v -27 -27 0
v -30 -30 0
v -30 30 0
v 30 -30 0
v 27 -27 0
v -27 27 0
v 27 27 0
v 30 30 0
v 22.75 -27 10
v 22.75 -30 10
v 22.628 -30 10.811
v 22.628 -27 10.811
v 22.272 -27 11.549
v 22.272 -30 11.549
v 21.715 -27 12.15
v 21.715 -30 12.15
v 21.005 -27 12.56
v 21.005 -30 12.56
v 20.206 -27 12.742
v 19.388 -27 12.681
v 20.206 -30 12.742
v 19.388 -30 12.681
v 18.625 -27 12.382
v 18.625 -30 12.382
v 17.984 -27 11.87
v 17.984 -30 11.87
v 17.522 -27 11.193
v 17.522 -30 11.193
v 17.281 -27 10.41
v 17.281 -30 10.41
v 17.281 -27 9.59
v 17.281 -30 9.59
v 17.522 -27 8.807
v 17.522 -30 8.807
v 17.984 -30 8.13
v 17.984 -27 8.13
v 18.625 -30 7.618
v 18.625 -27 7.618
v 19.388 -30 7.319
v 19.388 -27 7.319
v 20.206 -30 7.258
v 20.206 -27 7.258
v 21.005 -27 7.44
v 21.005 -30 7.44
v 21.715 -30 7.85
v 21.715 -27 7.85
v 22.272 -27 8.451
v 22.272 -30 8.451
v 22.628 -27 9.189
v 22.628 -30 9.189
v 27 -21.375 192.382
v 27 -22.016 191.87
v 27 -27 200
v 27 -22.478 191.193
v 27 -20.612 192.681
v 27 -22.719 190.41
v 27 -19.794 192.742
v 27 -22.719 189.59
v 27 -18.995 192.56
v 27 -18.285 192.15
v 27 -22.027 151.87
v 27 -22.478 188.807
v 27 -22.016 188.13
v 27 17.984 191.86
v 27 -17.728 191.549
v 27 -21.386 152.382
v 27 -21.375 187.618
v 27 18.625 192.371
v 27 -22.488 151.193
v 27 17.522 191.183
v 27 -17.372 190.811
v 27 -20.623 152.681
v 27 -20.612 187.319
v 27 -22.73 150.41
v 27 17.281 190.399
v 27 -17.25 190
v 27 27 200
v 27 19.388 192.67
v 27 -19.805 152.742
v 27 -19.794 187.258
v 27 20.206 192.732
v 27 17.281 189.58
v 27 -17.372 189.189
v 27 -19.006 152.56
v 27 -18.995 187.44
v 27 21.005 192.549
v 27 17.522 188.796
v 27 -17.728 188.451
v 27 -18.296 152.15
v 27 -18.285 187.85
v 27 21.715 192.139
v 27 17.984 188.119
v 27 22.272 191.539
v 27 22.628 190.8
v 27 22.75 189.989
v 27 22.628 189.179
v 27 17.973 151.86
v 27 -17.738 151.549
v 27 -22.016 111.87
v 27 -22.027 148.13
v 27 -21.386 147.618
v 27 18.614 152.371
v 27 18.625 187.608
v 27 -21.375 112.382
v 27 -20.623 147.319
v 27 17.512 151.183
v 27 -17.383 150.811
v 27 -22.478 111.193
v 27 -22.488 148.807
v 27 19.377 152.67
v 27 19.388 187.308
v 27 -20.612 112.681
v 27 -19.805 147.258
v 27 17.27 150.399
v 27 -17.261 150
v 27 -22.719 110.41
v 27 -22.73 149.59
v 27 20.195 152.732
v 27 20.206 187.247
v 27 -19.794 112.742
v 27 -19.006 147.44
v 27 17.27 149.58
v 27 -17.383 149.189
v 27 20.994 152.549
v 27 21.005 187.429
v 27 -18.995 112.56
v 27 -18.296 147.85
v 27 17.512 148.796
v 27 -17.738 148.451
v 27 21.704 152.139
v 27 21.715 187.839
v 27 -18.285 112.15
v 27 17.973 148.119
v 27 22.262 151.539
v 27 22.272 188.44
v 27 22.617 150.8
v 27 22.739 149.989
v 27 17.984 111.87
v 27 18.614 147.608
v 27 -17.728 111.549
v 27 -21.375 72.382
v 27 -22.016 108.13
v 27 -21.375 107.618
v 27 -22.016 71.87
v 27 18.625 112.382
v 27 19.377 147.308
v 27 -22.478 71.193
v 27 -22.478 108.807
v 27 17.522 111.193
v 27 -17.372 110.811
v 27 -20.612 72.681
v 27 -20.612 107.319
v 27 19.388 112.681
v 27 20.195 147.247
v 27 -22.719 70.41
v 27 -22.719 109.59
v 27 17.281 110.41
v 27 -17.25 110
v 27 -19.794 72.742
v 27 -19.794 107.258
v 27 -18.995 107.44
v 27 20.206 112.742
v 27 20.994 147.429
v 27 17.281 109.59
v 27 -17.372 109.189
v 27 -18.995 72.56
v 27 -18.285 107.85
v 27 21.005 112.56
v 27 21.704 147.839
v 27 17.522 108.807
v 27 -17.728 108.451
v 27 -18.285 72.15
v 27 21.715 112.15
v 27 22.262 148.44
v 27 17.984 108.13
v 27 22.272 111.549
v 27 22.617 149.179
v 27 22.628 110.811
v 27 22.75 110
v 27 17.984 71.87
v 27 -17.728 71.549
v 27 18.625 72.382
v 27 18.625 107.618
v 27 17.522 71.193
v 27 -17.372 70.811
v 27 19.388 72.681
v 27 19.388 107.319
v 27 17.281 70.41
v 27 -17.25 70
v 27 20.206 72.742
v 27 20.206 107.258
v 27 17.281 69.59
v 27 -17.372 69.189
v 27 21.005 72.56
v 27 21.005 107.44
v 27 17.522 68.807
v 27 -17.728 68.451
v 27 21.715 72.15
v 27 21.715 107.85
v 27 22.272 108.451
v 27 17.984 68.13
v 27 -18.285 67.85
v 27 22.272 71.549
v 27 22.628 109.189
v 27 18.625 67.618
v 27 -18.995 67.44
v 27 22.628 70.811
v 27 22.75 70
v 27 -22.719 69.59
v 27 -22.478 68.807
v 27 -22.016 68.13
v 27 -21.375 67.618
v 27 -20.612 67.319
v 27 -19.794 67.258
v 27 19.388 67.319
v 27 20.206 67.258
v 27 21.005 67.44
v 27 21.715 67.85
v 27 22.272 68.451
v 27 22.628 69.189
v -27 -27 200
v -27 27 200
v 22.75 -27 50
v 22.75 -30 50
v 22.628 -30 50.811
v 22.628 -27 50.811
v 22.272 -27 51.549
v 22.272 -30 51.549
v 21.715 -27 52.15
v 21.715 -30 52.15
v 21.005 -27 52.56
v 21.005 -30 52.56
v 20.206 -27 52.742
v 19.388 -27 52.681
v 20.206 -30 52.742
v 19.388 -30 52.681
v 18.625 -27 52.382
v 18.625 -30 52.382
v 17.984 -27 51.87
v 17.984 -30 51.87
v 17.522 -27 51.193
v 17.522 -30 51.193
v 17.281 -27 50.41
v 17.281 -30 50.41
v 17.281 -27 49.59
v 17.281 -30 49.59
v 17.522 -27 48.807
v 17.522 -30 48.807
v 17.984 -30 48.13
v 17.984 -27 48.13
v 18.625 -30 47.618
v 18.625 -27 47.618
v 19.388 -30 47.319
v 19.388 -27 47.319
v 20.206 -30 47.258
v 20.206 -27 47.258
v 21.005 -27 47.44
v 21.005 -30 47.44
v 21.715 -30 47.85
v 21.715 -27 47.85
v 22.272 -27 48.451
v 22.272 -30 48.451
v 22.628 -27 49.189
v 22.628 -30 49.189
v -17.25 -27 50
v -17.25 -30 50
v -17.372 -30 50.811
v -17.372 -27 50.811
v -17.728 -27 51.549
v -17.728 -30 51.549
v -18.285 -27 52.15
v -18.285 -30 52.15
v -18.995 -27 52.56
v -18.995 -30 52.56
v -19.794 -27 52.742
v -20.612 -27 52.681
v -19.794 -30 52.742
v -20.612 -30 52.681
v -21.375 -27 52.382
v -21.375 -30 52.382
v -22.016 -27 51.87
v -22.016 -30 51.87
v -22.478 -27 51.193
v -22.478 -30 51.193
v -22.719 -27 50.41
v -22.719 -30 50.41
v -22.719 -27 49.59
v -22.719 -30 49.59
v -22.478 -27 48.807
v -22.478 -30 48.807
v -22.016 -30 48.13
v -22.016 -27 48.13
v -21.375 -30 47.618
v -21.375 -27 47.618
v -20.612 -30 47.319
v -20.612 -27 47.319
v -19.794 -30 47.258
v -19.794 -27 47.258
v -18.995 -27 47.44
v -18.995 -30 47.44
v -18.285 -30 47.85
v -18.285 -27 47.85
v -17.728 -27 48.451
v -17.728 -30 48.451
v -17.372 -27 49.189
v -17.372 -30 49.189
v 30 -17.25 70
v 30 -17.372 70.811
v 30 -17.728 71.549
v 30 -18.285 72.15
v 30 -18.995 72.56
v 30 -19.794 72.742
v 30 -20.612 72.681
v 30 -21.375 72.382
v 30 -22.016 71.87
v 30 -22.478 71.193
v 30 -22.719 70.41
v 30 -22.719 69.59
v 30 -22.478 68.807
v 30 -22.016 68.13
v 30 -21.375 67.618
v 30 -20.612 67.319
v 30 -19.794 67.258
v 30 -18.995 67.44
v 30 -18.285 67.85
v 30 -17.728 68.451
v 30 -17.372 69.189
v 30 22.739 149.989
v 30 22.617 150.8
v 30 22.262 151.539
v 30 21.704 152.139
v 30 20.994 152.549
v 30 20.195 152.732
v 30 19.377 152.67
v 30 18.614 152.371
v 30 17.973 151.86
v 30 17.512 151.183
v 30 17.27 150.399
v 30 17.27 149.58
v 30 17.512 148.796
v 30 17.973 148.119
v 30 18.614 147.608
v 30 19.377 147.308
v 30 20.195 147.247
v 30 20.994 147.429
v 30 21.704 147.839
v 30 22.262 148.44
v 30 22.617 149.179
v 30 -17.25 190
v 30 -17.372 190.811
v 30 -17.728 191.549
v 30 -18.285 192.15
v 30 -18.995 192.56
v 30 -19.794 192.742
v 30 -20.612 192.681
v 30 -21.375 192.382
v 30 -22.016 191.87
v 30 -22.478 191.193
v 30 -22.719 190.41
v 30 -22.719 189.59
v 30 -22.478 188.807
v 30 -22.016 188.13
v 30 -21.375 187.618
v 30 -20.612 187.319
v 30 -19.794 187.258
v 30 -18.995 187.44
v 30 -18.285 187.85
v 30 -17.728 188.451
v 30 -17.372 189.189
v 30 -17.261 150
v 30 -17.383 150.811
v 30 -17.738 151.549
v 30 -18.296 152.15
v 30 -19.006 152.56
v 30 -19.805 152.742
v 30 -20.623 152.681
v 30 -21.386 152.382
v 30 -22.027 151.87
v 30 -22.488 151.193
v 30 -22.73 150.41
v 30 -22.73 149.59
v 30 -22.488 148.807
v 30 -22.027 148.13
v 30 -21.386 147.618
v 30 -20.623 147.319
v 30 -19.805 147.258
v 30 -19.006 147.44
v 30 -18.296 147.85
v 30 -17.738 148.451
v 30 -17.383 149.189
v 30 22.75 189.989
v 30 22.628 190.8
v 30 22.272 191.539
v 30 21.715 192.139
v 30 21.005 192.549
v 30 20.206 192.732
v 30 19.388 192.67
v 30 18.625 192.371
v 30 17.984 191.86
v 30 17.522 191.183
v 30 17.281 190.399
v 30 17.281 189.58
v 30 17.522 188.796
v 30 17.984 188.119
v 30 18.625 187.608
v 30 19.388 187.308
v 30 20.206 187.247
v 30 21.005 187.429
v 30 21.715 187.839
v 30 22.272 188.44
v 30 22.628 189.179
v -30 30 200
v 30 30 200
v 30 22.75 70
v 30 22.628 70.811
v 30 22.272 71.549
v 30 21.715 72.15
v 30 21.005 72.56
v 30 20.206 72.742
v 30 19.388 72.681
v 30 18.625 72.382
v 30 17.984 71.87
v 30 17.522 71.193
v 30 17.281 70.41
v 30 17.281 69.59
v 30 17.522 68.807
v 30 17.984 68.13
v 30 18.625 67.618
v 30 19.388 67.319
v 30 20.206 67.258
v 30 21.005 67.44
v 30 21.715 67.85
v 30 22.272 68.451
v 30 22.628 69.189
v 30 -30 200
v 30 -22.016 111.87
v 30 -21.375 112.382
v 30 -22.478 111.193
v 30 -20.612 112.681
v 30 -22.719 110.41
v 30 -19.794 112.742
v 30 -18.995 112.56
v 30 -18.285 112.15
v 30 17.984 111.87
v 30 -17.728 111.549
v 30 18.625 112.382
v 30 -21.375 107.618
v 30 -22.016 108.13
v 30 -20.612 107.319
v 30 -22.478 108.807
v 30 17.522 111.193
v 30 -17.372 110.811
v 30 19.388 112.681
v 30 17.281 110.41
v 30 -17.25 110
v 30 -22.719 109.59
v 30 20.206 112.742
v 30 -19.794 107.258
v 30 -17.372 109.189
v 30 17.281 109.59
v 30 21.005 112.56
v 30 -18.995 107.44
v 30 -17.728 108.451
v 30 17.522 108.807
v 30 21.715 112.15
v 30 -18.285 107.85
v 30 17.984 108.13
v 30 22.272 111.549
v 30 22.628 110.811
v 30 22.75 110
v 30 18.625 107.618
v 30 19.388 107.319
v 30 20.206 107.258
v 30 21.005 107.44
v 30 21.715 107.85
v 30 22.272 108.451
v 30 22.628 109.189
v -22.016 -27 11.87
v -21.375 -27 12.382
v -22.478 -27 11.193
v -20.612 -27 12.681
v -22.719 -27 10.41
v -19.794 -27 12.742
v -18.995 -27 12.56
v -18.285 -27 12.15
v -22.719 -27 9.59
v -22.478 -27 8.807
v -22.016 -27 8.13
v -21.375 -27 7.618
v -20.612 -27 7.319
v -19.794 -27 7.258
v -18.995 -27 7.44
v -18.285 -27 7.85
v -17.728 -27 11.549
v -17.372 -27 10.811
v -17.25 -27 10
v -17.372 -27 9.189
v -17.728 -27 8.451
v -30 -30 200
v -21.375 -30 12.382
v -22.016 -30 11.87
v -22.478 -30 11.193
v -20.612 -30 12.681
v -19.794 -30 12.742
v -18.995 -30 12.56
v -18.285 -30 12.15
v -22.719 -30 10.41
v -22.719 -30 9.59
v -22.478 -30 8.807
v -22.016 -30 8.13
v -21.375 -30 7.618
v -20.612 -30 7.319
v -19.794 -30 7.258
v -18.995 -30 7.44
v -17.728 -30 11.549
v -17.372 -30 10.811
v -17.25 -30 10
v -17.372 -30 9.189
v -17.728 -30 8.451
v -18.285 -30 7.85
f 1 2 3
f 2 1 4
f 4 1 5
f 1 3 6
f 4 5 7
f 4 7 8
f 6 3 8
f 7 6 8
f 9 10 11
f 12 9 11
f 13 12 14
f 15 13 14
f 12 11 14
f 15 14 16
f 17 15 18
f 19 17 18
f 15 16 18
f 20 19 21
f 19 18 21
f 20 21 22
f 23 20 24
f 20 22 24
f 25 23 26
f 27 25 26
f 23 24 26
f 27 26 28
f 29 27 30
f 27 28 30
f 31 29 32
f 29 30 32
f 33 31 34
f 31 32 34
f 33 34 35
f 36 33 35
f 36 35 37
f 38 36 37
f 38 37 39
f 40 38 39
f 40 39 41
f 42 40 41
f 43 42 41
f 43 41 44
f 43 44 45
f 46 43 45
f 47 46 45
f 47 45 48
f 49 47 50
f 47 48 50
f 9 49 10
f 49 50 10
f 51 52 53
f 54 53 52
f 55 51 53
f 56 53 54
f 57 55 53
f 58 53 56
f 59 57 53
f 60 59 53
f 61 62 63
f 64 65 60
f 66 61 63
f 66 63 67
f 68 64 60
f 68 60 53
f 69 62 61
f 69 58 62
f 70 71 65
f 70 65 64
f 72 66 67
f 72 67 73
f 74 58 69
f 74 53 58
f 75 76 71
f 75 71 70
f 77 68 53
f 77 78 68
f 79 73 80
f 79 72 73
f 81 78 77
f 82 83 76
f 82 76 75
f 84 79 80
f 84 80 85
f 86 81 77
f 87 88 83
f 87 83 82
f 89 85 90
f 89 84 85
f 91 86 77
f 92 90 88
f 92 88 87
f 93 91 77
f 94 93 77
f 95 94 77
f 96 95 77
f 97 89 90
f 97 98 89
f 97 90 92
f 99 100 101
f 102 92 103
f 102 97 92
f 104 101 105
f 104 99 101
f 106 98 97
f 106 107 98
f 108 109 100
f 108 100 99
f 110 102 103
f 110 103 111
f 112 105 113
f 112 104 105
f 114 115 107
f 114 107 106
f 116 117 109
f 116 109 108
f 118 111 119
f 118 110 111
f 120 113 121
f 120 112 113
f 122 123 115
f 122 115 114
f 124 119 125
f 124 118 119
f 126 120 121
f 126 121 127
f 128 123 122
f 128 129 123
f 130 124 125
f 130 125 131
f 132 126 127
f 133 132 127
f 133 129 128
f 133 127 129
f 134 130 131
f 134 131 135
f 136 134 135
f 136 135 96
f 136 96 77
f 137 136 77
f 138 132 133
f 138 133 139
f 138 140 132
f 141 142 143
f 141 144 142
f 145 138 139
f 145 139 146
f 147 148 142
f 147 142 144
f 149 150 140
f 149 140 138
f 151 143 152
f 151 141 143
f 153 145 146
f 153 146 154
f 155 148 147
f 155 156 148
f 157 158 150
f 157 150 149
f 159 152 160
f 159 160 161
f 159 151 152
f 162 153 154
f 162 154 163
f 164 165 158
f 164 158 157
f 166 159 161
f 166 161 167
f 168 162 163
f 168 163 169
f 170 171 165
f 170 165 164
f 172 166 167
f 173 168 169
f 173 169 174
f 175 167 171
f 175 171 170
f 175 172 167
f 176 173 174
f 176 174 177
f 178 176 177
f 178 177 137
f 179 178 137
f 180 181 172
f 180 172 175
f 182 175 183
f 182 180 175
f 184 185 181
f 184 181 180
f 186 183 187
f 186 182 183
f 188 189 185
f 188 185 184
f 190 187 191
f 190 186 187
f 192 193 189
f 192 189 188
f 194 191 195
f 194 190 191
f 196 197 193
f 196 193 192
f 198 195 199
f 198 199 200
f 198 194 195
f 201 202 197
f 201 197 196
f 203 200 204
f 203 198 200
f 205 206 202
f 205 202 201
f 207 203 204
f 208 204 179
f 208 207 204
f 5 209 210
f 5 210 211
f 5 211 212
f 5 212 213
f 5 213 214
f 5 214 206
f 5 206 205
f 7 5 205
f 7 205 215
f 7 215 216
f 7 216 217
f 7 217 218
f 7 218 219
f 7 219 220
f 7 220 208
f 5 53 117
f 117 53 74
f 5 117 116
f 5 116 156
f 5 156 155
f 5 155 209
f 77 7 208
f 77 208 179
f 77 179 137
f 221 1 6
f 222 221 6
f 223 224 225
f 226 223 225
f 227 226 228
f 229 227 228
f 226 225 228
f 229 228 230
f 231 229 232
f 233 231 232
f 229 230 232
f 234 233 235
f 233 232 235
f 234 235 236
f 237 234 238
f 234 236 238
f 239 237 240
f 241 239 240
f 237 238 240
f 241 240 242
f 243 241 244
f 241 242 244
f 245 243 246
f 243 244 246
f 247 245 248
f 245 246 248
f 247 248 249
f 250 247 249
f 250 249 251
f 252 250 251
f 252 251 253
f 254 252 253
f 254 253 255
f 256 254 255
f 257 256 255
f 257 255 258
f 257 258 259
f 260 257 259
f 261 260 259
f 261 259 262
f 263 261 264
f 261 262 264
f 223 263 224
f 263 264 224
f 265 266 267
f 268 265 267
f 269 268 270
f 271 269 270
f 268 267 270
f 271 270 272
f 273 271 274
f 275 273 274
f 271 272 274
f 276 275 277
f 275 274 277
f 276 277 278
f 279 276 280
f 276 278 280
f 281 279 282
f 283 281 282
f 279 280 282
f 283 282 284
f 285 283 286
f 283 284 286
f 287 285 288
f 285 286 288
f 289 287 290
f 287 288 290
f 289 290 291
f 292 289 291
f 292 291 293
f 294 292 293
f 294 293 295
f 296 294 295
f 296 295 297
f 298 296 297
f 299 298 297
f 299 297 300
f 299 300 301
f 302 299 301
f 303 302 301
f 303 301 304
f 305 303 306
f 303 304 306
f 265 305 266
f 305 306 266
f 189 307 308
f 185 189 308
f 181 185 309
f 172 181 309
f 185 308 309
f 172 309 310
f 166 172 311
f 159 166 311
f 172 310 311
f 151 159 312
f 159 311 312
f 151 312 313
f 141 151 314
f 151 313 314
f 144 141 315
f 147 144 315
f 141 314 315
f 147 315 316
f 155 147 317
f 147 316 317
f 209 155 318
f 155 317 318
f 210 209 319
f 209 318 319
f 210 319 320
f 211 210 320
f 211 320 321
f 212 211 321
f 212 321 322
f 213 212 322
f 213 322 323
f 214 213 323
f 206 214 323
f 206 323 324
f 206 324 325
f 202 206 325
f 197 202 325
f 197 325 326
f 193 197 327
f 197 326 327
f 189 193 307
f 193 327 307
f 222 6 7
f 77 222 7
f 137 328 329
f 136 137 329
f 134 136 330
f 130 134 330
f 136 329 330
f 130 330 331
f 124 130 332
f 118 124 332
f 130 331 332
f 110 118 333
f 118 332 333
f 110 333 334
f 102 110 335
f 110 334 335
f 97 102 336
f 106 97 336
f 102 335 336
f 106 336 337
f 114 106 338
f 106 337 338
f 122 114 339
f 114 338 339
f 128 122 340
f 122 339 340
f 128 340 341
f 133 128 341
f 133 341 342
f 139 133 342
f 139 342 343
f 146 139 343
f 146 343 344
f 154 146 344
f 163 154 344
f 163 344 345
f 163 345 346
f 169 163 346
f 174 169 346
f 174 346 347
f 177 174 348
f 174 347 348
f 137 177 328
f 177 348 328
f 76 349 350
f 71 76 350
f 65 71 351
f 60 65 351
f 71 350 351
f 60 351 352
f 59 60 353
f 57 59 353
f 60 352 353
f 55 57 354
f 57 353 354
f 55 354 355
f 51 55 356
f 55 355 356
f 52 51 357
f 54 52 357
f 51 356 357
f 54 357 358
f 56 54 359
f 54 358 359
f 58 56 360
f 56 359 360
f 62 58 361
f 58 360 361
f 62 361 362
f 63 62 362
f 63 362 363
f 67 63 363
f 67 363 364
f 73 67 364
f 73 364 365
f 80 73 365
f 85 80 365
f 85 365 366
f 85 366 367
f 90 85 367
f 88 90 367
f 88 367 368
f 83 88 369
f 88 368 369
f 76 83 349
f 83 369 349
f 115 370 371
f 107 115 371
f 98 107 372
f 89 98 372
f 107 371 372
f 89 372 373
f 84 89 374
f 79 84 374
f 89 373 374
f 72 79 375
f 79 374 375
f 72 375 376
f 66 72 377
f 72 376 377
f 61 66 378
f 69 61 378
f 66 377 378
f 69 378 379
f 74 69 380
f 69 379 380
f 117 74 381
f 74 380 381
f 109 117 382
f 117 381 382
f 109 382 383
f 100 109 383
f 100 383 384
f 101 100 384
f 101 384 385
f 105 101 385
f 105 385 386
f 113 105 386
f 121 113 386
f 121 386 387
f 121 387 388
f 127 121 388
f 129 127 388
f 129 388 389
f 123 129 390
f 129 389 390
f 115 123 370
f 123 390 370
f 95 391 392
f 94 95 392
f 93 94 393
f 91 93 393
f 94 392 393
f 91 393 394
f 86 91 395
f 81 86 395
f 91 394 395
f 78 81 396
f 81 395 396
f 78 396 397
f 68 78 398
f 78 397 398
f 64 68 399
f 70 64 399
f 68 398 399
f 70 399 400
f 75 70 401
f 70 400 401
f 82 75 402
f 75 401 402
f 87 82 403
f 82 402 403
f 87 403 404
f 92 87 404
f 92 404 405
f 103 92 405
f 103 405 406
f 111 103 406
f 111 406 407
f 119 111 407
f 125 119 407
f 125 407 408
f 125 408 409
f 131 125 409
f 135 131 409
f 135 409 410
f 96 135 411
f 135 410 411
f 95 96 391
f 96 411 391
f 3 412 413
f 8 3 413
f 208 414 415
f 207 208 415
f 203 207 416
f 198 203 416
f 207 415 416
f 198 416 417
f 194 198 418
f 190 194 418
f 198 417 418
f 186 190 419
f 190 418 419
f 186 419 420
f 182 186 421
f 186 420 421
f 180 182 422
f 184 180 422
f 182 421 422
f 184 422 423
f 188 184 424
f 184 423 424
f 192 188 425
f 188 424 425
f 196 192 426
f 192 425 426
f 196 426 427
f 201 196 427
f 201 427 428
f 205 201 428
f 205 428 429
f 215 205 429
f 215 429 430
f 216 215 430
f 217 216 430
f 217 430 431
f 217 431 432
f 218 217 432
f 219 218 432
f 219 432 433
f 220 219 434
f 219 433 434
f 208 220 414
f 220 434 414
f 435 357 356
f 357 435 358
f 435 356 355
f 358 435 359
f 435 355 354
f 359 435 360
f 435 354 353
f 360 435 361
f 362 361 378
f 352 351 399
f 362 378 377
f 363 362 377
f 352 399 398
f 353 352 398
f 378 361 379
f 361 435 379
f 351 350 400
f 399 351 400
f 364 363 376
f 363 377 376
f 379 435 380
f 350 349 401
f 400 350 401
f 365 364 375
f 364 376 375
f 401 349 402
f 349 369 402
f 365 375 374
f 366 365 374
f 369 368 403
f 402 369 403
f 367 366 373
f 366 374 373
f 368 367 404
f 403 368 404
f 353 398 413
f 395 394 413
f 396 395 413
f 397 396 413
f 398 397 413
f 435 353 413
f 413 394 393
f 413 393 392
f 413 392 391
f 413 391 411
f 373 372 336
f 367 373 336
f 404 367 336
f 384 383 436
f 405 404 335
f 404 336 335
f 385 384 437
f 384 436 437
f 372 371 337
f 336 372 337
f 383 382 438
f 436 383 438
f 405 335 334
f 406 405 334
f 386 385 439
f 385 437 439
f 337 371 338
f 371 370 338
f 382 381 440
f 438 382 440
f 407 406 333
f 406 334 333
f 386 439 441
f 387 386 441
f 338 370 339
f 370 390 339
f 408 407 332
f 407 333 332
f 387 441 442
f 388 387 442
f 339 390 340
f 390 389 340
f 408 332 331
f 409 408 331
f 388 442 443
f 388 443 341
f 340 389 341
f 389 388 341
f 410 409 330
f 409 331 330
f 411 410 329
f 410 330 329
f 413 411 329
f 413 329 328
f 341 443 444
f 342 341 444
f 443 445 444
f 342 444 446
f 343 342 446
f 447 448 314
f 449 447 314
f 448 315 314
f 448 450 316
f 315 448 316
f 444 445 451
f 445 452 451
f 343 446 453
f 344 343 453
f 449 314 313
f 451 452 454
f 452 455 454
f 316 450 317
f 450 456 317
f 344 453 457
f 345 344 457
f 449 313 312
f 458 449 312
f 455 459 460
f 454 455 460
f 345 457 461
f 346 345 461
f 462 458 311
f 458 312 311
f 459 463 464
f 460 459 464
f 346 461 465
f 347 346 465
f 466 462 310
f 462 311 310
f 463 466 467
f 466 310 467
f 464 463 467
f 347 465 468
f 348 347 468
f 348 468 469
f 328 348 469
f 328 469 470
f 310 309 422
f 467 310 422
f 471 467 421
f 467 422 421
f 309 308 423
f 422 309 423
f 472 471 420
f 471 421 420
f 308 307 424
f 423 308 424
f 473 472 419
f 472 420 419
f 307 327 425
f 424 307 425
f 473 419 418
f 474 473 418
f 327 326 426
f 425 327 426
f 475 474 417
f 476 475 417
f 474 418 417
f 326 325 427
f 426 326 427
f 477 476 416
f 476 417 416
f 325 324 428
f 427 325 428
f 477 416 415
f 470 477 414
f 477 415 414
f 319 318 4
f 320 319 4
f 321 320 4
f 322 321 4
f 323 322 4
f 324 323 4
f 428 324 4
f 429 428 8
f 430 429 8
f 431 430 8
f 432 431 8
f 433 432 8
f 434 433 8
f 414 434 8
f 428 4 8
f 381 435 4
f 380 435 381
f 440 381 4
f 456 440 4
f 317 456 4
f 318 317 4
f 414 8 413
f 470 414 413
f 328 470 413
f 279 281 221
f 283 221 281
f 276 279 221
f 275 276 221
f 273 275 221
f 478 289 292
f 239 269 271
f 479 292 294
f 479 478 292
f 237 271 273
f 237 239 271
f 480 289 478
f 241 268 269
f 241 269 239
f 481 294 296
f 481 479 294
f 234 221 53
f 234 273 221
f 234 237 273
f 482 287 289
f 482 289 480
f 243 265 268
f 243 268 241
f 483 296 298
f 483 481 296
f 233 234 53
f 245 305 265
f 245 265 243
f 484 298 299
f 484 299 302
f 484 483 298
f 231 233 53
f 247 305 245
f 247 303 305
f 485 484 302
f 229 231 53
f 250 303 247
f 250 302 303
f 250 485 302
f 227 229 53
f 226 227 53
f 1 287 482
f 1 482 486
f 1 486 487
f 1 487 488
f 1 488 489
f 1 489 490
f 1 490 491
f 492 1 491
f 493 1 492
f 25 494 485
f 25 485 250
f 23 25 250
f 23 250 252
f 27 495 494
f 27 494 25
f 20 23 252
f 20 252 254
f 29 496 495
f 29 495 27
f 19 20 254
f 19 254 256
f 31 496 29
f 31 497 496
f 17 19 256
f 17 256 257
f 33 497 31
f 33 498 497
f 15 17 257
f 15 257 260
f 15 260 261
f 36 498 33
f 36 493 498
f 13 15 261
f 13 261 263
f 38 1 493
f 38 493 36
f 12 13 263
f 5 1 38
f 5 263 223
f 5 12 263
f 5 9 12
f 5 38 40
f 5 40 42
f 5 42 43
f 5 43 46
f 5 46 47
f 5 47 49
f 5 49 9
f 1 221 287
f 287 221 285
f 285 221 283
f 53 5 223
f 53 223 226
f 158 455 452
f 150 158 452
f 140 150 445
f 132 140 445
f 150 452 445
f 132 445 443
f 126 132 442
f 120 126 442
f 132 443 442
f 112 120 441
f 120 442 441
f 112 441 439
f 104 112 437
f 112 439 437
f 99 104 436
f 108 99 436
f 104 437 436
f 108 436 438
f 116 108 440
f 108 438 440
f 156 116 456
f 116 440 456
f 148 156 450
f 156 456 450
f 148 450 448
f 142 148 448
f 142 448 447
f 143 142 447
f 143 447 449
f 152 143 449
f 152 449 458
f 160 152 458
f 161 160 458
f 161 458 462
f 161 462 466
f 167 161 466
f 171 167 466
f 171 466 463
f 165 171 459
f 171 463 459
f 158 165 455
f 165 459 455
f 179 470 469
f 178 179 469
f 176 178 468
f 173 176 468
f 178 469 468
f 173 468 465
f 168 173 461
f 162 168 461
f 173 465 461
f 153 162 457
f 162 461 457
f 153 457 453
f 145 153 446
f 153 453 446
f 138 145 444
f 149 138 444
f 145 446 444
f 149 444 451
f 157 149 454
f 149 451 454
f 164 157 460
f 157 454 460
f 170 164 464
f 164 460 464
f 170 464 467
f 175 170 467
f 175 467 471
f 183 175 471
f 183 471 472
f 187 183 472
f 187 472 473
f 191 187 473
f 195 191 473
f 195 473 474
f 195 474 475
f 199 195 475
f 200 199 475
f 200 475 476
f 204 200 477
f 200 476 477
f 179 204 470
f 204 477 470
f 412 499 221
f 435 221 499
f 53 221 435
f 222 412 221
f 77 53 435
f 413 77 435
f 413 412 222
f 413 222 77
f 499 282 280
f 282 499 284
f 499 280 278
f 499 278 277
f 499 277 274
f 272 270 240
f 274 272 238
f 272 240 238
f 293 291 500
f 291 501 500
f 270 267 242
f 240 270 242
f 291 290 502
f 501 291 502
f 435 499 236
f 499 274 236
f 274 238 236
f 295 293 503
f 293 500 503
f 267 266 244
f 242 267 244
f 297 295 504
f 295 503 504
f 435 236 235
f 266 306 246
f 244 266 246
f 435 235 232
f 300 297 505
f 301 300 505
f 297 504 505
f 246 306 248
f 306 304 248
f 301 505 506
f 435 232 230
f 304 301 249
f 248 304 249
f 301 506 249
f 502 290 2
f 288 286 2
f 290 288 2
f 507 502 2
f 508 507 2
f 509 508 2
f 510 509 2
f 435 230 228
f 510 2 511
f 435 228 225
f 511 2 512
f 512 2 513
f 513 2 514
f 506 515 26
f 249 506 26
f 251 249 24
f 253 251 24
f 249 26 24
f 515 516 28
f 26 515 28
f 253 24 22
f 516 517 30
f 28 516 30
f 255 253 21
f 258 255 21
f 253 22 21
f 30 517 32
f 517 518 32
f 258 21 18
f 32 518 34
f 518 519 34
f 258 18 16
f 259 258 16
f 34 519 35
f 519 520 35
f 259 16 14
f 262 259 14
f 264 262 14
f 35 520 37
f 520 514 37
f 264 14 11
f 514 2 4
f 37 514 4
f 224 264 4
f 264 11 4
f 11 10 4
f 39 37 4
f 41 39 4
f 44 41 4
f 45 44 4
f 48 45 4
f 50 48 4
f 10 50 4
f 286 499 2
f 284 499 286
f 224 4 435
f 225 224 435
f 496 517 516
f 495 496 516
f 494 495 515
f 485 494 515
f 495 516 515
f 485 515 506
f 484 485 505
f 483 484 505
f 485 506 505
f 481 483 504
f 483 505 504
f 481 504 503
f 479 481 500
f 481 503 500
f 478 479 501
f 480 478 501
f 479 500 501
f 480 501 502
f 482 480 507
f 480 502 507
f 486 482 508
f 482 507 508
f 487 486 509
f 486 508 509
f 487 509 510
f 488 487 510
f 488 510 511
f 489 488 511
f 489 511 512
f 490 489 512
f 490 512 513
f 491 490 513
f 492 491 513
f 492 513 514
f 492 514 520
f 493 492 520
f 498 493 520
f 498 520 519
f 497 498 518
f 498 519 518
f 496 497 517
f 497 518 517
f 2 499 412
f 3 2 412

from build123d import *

# Parameters (mm, degrees)
SKETCH_W        = 60
SKETCH_H        = 60
SKETCH_W_2      = 54
SKETCH_H_2      = 54
PAD_DEPTH       = 200
SKETCH001_R     = 2.75
POCKET_DEPTH    = 3
SKETCH002_R     = 2.75
POCKET001_DEPTH = 3


with BuildPart() as part:
    # Sketch → Pad (new body)
    with BuildSketch(Plane.XY):
        Rectangle(SKETCH_W, SKETCH_H)
        Rectangle(SKETCH_W_2, SKETCH_H_2, mode=Mode.SUBTRACT)
    extrude(amount=PAD_DEPTH)

    # Sketch001 (on Face3 of Pad) → Pocket (cut)
    with BuildSketch(Plane.XZ.offset(30)):
        with Locations((-20, 50)):
            Circle(SKETCH001_R)
        with Locations((20, 50)):
            Circle(SKETCH001_R)
        with Locations((-20, 10)):
            Circle(SKETCH001_R)
        with Locations((20, 10)):
            Circle(SKETCH001_R)
    extrude(amount=-POCKET_DEPTH, mode=Mode.SUBTRACT)

    # Sketch002 (on Face3 of Pocket) → Pocket001 (cut)
    with BuildSketch(Plane.YZ.offset(30)):
        with Locations((-20, 190)):
            Circle(SKETCH002_R)
        with Locations((19.999999, 189.989386)):
            Circle(SKETCH002_R)
        with Locations((-20.010614, 150.000001)):
            Circle(SKETCH002_R)
        with Locations((19.989384, 149.989387)):
            Circle(SKETCH002_R)
        with Locations((-20, 110.000001)):
            Circle(SKETCH002_R)
        with Locations((20, 110.000001)):
            Circle(SKETCH002_R)
        with Locations((-20, 70.000001)):
            Circle(SKETCH002_R)
        with Locations((20, 70.000001)):
            Circle(SKETCH002_R)
    extrude(amount=-POCKET001_DEPTH, mode=Mode.SUBTRACT)


solid = part.part
